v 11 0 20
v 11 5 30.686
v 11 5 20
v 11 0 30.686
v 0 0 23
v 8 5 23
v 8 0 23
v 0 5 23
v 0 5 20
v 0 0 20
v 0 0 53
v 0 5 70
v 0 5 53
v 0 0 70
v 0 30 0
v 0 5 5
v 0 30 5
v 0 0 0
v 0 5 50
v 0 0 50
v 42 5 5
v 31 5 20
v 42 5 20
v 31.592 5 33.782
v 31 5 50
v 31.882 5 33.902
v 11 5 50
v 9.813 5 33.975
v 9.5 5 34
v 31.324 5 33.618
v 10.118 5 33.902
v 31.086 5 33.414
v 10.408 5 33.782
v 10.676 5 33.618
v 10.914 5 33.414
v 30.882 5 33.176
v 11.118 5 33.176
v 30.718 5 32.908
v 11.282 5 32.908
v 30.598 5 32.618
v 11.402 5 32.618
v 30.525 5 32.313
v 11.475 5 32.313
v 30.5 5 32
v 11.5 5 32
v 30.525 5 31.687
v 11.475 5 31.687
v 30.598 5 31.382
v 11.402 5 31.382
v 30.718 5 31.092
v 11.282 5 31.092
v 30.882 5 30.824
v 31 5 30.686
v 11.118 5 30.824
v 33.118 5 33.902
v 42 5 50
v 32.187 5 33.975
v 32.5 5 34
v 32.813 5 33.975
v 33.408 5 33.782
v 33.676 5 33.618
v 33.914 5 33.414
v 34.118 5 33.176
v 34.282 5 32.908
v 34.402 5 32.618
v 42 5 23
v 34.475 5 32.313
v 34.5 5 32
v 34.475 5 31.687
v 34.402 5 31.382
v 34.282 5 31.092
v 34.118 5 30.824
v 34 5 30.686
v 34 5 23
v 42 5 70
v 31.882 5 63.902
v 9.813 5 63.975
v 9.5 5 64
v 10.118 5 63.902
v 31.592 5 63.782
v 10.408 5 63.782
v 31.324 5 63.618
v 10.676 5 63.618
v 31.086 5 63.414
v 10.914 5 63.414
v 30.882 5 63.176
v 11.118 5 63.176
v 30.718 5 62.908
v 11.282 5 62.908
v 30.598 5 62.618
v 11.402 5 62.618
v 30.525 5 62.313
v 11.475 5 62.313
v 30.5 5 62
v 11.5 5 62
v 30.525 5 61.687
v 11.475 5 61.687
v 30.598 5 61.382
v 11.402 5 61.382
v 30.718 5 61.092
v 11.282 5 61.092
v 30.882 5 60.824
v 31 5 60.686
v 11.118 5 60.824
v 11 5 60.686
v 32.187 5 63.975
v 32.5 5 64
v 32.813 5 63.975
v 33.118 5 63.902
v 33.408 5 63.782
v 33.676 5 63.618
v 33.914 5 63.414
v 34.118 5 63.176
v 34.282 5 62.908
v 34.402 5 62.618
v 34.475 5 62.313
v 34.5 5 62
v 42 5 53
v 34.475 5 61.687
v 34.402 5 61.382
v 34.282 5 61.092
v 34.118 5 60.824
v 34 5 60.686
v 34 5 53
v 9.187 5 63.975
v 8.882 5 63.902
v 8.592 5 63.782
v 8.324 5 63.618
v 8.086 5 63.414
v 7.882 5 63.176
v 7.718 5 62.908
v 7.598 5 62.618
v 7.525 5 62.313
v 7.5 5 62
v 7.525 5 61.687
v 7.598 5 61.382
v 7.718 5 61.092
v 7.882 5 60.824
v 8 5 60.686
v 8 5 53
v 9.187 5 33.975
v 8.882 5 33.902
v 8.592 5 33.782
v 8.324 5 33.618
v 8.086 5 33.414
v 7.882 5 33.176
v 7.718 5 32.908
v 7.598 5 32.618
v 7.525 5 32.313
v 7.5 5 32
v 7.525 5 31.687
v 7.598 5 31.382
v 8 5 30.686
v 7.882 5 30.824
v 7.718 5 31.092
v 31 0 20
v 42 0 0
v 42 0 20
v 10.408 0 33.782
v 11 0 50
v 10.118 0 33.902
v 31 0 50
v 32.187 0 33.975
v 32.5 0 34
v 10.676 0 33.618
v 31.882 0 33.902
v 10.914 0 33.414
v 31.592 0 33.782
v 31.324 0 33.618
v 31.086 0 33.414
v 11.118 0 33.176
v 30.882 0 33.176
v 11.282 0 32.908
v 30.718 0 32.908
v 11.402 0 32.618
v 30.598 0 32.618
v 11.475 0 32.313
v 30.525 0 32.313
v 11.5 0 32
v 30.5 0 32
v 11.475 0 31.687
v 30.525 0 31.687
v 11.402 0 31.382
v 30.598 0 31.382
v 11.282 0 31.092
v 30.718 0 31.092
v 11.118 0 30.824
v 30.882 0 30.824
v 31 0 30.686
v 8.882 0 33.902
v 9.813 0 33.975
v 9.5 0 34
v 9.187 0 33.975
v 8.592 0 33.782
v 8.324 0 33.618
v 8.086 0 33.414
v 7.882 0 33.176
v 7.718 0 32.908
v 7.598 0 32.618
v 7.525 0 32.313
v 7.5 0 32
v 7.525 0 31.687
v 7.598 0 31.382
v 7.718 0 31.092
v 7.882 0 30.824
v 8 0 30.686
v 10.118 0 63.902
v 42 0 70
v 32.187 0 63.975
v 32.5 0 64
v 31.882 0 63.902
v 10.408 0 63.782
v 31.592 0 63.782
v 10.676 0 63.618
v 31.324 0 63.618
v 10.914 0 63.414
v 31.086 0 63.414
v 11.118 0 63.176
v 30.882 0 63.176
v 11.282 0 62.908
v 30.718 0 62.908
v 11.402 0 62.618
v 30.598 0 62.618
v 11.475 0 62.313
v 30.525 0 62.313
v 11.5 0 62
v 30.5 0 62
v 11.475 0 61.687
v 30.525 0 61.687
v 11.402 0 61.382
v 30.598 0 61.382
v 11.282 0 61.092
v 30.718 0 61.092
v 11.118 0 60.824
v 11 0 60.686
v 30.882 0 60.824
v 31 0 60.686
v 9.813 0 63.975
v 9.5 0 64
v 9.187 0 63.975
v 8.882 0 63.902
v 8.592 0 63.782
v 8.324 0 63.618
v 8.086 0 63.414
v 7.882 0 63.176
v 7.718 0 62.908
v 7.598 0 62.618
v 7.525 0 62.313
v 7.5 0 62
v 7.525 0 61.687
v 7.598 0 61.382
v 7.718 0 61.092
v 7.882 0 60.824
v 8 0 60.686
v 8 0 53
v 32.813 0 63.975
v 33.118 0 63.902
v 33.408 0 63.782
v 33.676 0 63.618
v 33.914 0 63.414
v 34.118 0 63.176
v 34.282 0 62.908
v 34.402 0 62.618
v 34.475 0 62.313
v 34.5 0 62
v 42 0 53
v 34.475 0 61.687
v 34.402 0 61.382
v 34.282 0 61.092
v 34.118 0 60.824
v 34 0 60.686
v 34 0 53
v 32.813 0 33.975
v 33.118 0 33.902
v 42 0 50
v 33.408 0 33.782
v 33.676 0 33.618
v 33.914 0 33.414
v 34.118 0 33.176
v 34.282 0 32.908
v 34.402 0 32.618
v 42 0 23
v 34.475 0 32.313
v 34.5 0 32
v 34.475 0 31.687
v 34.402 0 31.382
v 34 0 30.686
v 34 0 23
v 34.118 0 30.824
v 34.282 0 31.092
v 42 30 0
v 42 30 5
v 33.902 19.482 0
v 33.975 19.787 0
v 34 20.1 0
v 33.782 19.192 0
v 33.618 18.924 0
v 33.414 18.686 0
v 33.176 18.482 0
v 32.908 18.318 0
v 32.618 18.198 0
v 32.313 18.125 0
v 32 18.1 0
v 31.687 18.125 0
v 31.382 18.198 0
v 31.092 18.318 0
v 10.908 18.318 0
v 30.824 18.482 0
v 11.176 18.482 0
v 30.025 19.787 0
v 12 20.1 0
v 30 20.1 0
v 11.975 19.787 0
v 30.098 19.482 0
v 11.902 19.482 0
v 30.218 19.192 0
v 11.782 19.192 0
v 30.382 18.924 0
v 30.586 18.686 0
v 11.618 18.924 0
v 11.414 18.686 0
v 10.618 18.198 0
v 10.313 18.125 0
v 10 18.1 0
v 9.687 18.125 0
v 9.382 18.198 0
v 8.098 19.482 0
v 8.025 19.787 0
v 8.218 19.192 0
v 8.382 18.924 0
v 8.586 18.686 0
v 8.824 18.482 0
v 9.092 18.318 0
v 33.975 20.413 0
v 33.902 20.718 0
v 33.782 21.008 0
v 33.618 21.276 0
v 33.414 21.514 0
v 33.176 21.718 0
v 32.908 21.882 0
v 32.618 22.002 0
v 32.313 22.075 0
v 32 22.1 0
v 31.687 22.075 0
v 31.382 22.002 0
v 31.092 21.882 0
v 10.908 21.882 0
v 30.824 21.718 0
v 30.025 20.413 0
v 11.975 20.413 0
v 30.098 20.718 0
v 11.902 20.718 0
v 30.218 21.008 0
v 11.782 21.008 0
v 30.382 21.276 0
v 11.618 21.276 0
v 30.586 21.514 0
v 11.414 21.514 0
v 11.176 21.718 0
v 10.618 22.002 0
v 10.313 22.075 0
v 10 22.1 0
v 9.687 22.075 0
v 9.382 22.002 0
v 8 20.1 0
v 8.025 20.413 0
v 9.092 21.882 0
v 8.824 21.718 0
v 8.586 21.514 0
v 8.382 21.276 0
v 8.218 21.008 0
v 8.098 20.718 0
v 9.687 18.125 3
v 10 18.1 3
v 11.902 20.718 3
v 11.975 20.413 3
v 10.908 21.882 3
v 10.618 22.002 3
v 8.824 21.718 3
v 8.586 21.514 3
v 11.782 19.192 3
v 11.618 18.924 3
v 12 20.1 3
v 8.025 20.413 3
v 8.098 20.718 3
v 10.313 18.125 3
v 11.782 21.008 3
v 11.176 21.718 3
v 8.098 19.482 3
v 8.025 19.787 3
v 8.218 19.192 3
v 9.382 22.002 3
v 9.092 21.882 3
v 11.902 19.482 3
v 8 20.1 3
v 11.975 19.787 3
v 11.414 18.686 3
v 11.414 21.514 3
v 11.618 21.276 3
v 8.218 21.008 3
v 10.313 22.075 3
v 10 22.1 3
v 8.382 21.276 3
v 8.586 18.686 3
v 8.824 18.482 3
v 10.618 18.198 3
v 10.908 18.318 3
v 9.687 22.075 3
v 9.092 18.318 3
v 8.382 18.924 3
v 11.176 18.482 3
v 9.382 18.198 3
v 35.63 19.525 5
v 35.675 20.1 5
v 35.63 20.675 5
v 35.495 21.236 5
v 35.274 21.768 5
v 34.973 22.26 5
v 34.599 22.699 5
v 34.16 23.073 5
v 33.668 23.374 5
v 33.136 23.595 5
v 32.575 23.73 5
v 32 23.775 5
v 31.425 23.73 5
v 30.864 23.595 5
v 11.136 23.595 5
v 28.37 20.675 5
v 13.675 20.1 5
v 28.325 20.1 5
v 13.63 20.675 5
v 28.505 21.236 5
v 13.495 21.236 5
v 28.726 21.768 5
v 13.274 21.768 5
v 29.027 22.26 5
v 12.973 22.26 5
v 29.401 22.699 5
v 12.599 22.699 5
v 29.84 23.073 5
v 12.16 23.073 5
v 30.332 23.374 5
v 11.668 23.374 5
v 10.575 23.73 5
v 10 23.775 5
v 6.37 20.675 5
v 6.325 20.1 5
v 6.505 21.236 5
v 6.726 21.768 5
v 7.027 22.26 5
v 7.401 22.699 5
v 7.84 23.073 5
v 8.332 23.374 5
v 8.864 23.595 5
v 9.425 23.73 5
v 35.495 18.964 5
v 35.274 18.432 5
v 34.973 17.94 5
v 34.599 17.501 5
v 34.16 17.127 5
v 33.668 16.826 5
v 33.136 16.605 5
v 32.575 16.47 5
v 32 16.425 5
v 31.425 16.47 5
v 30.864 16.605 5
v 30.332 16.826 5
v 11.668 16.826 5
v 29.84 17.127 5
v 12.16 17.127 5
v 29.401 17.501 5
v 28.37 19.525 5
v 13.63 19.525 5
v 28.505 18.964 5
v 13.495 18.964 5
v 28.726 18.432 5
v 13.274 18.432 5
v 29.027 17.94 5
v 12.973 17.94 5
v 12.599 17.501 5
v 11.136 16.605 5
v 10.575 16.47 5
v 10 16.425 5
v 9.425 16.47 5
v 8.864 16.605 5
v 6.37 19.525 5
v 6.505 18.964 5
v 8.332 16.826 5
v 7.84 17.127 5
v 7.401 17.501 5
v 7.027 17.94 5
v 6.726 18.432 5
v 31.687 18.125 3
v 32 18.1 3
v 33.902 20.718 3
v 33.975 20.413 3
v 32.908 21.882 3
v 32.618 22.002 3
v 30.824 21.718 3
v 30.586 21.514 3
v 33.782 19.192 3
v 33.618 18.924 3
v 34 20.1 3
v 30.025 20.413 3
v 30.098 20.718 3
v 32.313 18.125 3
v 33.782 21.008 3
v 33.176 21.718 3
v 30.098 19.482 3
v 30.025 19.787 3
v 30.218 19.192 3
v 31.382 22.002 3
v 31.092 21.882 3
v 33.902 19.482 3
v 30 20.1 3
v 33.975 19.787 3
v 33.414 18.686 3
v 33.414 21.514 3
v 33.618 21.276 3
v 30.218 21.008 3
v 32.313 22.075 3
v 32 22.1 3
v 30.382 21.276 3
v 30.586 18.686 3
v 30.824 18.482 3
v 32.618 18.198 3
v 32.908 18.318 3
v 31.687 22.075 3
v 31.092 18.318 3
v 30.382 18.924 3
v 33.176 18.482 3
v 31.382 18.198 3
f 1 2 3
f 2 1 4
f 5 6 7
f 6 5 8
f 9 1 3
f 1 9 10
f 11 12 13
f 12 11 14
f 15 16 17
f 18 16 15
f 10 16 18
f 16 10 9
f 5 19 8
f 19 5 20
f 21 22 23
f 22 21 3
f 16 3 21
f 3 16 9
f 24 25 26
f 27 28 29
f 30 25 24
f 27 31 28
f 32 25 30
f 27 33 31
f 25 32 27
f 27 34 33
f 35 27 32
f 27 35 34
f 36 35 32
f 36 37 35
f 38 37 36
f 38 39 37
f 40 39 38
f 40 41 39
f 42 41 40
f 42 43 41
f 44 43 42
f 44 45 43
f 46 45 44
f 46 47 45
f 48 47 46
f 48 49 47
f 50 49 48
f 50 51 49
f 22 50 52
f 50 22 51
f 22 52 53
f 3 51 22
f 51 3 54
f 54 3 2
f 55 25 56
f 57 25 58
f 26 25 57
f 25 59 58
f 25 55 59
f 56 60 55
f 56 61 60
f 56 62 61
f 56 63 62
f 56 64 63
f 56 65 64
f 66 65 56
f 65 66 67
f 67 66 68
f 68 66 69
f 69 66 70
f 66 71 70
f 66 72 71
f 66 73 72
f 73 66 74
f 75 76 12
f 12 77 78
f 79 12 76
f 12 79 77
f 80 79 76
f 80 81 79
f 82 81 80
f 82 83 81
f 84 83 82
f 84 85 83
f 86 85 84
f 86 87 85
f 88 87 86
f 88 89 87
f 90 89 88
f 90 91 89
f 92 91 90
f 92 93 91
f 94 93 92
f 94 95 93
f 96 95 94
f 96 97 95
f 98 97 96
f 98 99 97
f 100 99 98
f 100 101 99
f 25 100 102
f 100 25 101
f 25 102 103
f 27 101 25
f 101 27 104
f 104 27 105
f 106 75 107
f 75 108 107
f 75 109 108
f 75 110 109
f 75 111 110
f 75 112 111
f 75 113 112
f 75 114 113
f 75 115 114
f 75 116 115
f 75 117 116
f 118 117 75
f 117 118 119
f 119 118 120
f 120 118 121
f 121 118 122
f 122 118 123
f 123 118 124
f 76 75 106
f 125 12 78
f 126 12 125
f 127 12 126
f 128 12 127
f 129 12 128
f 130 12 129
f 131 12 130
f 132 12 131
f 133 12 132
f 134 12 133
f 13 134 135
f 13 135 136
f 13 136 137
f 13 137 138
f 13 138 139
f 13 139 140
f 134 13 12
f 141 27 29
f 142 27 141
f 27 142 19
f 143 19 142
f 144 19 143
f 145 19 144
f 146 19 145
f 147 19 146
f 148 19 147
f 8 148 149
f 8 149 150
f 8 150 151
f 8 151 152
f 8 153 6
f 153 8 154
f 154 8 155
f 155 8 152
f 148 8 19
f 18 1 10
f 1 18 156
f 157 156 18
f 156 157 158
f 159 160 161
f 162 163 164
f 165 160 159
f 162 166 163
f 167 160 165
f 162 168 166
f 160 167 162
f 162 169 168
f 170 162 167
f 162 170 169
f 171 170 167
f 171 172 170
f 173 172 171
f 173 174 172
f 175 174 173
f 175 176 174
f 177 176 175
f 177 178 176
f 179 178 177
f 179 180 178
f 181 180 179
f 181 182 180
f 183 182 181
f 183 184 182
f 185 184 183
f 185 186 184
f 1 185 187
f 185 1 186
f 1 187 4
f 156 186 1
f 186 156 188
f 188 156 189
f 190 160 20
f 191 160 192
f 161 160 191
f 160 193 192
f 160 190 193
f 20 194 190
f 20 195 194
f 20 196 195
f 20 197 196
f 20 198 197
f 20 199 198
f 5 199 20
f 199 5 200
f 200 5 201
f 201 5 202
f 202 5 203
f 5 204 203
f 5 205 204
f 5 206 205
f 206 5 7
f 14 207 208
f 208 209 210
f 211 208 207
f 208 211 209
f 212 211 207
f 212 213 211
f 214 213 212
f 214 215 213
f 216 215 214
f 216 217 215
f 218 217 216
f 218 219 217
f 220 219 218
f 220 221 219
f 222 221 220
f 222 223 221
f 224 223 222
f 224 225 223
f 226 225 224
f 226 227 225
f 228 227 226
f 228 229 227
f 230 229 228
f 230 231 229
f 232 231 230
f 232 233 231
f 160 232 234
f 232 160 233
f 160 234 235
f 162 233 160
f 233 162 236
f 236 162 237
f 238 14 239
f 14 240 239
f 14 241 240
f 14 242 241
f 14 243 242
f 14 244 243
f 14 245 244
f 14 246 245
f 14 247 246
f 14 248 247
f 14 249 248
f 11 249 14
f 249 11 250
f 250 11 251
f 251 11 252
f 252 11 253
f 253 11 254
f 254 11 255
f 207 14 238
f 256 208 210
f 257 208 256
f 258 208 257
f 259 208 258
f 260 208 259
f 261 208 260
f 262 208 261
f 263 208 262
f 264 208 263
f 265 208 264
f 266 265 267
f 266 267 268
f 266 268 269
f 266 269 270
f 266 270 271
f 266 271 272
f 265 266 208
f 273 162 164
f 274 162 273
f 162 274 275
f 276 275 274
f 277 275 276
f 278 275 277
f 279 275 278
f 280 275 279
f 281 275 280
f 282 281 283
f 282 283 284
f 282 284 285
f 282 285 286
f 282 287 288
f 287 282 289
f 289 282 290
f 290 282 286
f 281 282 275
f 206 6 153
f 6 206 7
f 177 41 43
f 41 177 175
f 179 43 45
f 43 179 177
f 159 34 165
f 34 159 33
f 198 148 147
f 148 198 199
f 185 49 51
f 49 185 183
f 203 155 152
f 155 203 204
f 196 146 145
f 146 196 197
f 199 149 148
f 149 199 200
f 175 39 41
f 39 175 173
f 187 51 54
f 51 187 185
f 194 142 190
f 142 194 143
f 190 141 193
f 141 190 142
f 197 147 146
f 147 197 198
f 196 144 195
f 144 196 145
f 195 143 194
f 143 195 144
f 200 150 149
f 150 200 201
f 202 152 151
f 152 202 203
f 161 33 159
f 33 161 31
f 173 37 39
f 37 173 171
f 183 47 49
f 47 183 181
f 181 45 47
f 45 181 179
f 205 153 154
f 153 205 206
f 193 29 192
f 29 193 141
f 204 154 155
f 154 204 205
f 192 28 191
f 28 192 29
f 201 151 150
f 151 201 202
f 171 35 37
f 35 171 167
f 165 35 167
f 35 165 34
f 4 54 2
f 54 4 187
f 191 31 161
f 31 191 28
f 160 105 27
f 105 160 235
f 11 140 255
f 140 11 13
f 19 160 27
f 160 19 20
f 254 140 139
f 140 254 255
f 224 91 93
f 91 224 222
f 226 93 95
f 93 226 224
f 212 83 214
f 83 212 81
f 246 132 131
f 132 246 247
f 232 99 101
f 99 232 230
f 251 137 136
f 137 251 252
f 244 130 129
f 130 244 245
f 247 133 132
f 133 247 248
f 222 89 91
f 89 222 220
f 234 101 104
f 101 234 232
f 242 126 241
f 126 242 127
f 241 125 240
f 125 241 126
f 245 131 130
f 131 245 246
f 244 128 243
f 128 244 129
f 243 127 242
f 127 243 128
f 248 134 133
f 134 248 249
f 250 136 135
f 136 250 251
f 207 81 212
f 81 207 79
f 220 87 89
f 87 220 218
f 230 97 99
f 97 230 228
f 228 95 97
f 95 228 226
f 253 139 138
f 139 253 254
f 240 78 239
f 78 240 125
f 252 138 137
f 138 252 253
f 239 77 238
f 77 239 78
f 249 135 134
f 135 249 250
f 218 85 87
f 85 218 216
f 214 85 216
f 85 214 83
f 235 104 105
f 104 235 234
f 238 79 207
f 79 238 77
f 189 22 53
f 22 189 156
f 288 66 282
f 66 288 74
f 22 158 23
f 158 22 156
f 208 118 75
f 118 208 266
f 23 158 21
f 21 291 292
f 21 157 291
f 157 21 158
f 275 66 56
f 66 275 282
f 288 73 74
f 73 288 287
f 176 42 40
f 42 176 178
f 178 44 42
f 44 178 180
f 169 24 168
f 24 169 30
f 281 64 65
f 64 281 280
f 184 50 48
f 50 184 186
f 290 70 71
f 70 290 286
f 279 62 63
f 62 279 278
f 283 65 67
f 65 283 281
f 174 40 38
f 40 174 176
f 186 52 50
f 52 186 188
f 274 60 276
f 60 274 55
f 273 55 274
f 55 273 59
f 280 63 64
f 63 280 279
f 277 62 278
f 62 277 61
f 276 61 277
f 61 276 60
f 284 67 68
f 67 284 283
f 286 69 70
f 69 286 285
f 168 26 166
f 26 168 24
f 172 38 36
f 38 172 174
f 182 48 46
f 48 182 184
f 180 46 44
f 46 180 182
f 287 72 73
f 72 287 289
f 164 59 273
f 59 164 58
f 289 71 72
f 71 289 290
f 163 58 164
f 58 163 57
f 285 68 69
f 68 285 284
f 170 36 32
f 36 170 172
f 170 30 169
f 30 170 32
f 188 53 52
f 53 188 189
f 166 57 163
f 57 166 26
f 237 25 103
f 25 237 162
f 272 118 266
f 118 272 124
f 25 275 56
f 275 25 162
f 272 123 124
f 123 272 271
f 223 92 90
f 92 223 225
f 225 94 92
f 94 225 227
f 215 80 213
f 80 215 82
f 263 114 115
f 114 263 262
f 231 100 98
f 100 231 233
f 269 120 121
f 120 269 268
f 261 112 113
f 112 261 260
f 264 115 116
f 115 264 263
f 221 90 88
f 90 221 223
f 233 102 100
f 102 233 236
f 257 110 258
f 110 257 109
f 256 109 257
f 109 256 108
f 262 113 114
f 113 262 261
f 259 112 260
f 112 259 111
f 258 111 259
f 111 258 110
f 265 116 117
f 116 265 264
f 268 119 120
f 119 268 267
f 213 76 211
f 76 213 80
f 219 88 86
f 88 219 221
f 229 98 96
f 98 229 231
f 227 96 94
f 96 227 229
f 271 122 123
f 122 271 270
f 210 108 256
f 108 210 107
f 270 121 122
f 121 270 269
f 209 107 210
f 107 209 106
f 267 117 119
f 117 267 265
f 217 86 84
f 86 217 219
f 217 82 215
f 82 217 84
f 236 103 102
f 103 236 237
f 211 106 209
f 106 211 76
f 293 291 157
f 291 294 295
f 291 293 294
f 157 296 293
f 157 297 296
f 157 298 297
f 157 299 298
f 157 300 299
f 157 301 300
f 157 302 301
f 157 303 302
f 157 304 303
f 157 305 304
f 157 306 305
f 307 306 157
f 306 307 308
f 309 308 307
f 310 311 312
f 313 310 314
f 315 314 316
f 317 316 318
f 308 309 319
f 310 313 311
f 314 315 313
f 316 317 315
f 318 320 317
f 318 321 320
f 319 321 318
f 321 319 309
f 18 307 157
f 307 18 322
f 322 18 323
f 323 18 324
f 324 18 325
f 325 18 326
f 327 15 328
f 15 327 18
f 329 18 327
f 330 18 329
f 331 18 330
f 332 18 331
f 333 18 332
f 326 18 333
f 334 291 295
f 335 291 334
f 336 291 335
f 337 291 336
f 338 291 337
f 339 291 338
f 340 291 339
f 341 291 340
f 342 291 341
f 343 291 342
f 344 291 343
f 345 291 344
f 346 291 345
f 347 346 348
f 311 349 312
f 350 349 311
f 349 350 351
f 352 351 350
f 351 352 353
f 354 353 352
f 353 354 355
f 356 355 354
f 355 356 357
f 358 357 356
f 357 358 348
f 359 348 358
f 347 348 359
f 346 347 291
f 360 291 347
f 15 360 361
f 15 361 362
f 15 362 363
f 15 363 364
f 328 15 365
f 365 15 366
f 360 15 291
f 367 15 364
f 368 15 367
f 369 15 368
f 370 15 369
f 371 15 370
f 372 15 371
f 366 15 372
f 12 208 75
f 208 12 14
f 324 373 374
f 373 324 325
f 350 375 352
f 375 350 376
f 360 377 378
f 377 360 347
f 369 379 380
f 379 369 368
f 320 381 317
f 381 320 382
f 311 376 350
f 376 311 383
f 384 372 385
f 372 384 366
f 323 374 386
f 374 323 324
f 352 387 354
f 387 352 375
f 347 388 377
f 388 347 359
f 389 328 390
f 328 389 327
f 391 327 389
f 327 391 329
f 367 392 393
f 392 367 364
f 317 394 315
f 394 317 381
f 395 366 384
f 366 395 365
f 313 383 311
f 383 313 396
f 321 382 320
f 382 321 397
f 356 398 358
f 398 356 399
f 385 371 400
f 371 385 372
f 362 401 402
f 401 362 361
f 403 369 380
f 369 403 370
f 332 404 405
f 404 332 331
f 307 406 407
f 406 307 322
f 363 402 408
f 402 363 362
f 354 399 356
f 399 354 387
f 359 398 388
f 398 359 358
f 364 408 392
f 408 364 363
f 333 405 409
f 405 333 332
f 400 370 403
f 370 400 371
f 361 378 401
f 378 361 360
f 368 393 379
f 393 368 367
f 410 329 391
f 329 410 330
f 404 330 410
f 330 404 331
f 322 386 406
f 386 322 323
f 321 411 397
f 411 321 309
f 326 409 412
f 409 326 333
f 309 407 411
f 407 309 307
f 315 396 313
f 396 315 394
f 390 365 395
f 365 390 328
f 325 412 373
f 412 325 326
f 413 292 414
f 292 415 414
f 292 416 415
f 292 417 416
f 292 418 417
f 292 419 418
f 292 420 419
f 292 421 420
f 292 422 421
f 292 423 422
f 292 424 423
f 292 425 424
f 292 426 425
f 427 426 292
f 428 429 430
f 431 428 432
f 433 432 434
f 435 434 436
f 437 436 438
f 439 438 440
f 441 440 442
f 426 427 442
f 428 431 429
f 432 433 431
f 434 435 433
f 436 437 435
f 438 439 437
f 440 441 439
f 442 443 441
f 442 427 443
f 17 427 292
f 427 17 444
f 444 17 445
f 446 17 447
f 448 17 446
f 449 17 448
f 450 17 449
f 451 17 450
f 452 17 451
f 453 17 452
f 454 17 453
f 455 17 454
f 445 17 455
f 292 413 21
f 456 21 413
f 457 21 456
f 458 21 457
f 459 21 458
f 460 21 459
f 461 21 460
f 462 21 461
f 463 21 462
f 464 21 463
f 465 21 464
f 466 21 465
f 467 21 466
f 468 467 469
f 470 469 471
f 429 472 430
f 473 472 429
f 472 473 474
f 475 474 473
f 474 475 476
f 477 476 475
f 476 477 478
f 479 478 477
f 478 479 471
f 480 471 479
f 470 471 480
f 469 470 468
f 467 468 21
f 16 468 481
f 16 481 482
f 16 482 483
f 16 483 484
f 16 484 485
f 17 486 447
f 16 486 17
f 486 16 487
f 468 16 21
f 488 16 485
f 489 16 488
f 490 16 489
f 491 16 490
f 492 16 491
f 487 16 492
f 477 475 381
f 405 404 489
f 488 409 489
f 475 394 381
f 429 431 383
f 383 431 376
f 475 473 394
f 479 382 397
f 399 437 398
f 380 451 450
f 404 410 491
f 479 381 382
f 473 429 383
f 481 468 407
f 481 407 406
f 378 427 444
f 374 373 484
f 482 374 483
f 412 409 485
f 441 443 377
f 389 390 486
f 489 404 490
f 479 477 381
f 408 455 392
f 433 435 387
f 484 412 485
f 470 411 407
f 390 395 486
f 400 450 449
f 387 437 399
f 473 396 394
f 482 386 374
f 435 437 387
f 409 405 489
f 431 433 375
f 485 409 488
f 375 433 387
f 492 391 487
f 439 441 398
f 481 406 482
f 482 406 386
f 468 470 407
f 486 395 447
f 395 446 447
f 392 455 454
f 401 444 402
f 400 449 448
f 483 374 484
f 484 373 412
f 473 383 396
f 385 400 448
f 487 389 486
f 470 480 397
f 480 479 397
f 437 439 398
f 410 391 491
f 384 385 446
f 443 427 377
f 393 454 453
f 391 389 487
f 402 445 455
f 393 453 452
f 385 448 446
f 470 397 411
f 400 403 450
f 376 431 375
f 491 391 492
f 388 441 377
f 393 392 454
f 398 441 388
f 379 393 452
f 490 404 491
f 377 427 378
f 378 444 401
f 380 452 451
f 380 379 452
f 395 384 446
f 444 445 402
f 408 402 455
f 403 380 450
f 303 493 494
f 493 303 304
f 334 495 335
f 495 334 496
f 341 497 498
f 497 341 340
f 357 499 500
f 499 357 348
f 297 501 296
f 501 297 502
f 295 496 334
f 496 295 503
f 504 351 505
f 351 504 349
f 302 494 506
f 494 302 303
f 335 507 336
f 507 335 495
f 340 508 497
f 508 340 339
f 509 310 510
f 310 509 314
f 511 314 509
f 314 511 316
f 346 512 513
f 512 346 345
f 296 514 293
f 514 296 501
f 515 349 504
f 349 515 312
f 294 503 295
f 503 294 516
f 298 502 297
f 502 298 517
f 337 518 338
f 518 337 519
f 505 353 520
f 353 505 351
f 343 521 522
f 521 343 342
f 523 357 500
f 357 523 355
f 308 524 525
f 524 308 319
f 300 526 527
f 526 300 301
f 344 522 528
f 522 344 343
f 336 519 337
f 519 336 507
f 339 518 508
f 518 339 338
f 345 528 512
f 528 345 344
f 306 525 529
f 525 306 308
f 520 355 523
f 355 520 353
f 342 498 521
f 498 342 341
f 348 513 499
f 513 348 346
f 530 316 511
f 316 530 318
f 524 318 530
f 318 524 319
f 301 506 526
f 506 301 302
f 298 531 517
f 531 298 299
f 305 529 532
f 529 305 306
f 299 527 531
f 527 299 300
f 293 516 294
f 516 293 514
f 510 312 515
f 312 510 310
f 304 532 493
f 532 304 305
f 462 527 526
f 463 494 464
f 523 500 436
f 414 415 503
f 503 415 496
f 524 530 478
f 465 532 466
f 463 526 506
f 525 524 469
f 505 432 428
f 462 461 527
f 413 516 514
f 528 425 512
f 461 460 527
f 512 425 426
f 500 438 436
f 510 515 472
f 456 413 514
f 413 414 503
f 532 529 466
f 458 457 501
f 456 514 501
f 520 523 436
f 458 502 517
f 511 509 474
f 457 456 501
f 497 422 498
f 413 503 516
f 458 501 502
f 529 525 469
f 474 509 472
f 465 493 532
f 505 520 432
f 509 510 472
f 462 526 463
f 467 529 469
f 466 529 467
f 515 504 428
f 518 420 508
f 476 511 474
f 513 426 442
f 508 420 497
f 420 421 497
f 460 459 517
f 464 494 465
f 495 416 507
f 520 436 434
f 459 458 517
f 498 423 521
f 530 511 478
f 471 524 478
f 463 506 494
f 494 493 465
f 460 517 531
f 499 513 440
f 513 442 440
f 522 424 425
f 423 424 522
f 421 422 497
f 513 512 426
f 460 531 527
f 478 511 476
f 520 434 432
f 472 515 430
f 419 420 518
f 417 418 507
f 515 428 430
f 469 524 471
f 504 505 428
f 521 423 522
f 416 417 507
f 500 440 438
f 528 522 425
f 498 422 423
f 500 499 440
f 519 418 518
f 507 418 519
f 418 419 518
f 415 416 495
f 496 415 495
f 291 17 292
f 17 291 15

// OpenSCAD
/* Wire Stand-off for Model Railroad.
   Holds bus wires away from benchwork, with slots
   to separate and hold two wires in position.
*/
/***** Display options while rendering *****
 *  disable
 !  show only
 #  highlight / debug
 %  transparent / background
*/
/*  PARAMETERS - values in brackets are suggested starting values)  */
// Width of Bracket
b_width = 42;
// Height of bracket
b_height = 70;
// Width of slot
slot_w = 3;
// Length of slot
slot_l = 12;
// Distance from mounting leg to first slot
offset1 = 20;
// Distance from mounting leg to second slot
offset2 = 50;
// Diameter of holes that wires sit in
hole_diam = 4;
// Width of top flange - with screw holes
flange_d = 30;
// Distance between wires
wire_sep = 20;

// Main Body
module main(){
    difference(){
        linear_extrude(height = b_height){
            square([b_width,5],center=false);
        }
        //first slot
        translate([0,0,offset1]){
            slots();
        }
        //second slot
        translate([0,0,offset2]){
            slots();
        }
        translate([b_width,0,0]){
            #mirror([1,0,0]){
                //third slot
                translate([0,0,offset1]){
                    slots();
                }
                //fourth slot
                translate([0,0,offset2]){
                    slots();
                }
            }
        }
    }
}
//Mounting Flange
module flange(){
    linear_extrude(height = 5){
        square([b_width,flange_d],center=false);
    }
}
module screw_holes(){
    hole_offset = (flange_d)*(.67);
    //first hole
    translate([10,hole_offset,0]){
        cylinder(h=5,d=4,$fn=40,center=false);
        //countersink it
        translate([0,0,3]){
            cylinder(h=2,d1=4,d2=7.35,$fn=40,center=false);
        }
    }
    offset = b_width - 10;
    //second hole
    translate([offset,hole_offset,0]){
        cylinder(h=5, d=4,$fn=40,center=false);
        //countersink it
        translate([0,0,3]){
            cylinder(h=2,d1=4,d2=7.35,$fn=40,center=false);
        }
    }
}
module slots(){
    // some offsets
    a = b_width/2;
    b = (b_width/2) - (wire_sep/2);
    c = b - slot_w;
    d = (b-c)/2;
    e = c+hole_diam/2-((hole_diam-slot_w)/2);
    
    translate([0,0,0]){
        cube([b,5,slot_w],center = false);
    }
    translate([c,0,0]){
        cube([slot_w,5,slot_l],center = false);
    }
    translate([e,0,slot_l]){
        rotate(a=[90,0,0])
        cylinder(h=10,d=hole_diam,$fn=40,center=true);
    }
}
// Now put it all together
    main();
    difference(){
        flange();
        screw_holes();
    }
